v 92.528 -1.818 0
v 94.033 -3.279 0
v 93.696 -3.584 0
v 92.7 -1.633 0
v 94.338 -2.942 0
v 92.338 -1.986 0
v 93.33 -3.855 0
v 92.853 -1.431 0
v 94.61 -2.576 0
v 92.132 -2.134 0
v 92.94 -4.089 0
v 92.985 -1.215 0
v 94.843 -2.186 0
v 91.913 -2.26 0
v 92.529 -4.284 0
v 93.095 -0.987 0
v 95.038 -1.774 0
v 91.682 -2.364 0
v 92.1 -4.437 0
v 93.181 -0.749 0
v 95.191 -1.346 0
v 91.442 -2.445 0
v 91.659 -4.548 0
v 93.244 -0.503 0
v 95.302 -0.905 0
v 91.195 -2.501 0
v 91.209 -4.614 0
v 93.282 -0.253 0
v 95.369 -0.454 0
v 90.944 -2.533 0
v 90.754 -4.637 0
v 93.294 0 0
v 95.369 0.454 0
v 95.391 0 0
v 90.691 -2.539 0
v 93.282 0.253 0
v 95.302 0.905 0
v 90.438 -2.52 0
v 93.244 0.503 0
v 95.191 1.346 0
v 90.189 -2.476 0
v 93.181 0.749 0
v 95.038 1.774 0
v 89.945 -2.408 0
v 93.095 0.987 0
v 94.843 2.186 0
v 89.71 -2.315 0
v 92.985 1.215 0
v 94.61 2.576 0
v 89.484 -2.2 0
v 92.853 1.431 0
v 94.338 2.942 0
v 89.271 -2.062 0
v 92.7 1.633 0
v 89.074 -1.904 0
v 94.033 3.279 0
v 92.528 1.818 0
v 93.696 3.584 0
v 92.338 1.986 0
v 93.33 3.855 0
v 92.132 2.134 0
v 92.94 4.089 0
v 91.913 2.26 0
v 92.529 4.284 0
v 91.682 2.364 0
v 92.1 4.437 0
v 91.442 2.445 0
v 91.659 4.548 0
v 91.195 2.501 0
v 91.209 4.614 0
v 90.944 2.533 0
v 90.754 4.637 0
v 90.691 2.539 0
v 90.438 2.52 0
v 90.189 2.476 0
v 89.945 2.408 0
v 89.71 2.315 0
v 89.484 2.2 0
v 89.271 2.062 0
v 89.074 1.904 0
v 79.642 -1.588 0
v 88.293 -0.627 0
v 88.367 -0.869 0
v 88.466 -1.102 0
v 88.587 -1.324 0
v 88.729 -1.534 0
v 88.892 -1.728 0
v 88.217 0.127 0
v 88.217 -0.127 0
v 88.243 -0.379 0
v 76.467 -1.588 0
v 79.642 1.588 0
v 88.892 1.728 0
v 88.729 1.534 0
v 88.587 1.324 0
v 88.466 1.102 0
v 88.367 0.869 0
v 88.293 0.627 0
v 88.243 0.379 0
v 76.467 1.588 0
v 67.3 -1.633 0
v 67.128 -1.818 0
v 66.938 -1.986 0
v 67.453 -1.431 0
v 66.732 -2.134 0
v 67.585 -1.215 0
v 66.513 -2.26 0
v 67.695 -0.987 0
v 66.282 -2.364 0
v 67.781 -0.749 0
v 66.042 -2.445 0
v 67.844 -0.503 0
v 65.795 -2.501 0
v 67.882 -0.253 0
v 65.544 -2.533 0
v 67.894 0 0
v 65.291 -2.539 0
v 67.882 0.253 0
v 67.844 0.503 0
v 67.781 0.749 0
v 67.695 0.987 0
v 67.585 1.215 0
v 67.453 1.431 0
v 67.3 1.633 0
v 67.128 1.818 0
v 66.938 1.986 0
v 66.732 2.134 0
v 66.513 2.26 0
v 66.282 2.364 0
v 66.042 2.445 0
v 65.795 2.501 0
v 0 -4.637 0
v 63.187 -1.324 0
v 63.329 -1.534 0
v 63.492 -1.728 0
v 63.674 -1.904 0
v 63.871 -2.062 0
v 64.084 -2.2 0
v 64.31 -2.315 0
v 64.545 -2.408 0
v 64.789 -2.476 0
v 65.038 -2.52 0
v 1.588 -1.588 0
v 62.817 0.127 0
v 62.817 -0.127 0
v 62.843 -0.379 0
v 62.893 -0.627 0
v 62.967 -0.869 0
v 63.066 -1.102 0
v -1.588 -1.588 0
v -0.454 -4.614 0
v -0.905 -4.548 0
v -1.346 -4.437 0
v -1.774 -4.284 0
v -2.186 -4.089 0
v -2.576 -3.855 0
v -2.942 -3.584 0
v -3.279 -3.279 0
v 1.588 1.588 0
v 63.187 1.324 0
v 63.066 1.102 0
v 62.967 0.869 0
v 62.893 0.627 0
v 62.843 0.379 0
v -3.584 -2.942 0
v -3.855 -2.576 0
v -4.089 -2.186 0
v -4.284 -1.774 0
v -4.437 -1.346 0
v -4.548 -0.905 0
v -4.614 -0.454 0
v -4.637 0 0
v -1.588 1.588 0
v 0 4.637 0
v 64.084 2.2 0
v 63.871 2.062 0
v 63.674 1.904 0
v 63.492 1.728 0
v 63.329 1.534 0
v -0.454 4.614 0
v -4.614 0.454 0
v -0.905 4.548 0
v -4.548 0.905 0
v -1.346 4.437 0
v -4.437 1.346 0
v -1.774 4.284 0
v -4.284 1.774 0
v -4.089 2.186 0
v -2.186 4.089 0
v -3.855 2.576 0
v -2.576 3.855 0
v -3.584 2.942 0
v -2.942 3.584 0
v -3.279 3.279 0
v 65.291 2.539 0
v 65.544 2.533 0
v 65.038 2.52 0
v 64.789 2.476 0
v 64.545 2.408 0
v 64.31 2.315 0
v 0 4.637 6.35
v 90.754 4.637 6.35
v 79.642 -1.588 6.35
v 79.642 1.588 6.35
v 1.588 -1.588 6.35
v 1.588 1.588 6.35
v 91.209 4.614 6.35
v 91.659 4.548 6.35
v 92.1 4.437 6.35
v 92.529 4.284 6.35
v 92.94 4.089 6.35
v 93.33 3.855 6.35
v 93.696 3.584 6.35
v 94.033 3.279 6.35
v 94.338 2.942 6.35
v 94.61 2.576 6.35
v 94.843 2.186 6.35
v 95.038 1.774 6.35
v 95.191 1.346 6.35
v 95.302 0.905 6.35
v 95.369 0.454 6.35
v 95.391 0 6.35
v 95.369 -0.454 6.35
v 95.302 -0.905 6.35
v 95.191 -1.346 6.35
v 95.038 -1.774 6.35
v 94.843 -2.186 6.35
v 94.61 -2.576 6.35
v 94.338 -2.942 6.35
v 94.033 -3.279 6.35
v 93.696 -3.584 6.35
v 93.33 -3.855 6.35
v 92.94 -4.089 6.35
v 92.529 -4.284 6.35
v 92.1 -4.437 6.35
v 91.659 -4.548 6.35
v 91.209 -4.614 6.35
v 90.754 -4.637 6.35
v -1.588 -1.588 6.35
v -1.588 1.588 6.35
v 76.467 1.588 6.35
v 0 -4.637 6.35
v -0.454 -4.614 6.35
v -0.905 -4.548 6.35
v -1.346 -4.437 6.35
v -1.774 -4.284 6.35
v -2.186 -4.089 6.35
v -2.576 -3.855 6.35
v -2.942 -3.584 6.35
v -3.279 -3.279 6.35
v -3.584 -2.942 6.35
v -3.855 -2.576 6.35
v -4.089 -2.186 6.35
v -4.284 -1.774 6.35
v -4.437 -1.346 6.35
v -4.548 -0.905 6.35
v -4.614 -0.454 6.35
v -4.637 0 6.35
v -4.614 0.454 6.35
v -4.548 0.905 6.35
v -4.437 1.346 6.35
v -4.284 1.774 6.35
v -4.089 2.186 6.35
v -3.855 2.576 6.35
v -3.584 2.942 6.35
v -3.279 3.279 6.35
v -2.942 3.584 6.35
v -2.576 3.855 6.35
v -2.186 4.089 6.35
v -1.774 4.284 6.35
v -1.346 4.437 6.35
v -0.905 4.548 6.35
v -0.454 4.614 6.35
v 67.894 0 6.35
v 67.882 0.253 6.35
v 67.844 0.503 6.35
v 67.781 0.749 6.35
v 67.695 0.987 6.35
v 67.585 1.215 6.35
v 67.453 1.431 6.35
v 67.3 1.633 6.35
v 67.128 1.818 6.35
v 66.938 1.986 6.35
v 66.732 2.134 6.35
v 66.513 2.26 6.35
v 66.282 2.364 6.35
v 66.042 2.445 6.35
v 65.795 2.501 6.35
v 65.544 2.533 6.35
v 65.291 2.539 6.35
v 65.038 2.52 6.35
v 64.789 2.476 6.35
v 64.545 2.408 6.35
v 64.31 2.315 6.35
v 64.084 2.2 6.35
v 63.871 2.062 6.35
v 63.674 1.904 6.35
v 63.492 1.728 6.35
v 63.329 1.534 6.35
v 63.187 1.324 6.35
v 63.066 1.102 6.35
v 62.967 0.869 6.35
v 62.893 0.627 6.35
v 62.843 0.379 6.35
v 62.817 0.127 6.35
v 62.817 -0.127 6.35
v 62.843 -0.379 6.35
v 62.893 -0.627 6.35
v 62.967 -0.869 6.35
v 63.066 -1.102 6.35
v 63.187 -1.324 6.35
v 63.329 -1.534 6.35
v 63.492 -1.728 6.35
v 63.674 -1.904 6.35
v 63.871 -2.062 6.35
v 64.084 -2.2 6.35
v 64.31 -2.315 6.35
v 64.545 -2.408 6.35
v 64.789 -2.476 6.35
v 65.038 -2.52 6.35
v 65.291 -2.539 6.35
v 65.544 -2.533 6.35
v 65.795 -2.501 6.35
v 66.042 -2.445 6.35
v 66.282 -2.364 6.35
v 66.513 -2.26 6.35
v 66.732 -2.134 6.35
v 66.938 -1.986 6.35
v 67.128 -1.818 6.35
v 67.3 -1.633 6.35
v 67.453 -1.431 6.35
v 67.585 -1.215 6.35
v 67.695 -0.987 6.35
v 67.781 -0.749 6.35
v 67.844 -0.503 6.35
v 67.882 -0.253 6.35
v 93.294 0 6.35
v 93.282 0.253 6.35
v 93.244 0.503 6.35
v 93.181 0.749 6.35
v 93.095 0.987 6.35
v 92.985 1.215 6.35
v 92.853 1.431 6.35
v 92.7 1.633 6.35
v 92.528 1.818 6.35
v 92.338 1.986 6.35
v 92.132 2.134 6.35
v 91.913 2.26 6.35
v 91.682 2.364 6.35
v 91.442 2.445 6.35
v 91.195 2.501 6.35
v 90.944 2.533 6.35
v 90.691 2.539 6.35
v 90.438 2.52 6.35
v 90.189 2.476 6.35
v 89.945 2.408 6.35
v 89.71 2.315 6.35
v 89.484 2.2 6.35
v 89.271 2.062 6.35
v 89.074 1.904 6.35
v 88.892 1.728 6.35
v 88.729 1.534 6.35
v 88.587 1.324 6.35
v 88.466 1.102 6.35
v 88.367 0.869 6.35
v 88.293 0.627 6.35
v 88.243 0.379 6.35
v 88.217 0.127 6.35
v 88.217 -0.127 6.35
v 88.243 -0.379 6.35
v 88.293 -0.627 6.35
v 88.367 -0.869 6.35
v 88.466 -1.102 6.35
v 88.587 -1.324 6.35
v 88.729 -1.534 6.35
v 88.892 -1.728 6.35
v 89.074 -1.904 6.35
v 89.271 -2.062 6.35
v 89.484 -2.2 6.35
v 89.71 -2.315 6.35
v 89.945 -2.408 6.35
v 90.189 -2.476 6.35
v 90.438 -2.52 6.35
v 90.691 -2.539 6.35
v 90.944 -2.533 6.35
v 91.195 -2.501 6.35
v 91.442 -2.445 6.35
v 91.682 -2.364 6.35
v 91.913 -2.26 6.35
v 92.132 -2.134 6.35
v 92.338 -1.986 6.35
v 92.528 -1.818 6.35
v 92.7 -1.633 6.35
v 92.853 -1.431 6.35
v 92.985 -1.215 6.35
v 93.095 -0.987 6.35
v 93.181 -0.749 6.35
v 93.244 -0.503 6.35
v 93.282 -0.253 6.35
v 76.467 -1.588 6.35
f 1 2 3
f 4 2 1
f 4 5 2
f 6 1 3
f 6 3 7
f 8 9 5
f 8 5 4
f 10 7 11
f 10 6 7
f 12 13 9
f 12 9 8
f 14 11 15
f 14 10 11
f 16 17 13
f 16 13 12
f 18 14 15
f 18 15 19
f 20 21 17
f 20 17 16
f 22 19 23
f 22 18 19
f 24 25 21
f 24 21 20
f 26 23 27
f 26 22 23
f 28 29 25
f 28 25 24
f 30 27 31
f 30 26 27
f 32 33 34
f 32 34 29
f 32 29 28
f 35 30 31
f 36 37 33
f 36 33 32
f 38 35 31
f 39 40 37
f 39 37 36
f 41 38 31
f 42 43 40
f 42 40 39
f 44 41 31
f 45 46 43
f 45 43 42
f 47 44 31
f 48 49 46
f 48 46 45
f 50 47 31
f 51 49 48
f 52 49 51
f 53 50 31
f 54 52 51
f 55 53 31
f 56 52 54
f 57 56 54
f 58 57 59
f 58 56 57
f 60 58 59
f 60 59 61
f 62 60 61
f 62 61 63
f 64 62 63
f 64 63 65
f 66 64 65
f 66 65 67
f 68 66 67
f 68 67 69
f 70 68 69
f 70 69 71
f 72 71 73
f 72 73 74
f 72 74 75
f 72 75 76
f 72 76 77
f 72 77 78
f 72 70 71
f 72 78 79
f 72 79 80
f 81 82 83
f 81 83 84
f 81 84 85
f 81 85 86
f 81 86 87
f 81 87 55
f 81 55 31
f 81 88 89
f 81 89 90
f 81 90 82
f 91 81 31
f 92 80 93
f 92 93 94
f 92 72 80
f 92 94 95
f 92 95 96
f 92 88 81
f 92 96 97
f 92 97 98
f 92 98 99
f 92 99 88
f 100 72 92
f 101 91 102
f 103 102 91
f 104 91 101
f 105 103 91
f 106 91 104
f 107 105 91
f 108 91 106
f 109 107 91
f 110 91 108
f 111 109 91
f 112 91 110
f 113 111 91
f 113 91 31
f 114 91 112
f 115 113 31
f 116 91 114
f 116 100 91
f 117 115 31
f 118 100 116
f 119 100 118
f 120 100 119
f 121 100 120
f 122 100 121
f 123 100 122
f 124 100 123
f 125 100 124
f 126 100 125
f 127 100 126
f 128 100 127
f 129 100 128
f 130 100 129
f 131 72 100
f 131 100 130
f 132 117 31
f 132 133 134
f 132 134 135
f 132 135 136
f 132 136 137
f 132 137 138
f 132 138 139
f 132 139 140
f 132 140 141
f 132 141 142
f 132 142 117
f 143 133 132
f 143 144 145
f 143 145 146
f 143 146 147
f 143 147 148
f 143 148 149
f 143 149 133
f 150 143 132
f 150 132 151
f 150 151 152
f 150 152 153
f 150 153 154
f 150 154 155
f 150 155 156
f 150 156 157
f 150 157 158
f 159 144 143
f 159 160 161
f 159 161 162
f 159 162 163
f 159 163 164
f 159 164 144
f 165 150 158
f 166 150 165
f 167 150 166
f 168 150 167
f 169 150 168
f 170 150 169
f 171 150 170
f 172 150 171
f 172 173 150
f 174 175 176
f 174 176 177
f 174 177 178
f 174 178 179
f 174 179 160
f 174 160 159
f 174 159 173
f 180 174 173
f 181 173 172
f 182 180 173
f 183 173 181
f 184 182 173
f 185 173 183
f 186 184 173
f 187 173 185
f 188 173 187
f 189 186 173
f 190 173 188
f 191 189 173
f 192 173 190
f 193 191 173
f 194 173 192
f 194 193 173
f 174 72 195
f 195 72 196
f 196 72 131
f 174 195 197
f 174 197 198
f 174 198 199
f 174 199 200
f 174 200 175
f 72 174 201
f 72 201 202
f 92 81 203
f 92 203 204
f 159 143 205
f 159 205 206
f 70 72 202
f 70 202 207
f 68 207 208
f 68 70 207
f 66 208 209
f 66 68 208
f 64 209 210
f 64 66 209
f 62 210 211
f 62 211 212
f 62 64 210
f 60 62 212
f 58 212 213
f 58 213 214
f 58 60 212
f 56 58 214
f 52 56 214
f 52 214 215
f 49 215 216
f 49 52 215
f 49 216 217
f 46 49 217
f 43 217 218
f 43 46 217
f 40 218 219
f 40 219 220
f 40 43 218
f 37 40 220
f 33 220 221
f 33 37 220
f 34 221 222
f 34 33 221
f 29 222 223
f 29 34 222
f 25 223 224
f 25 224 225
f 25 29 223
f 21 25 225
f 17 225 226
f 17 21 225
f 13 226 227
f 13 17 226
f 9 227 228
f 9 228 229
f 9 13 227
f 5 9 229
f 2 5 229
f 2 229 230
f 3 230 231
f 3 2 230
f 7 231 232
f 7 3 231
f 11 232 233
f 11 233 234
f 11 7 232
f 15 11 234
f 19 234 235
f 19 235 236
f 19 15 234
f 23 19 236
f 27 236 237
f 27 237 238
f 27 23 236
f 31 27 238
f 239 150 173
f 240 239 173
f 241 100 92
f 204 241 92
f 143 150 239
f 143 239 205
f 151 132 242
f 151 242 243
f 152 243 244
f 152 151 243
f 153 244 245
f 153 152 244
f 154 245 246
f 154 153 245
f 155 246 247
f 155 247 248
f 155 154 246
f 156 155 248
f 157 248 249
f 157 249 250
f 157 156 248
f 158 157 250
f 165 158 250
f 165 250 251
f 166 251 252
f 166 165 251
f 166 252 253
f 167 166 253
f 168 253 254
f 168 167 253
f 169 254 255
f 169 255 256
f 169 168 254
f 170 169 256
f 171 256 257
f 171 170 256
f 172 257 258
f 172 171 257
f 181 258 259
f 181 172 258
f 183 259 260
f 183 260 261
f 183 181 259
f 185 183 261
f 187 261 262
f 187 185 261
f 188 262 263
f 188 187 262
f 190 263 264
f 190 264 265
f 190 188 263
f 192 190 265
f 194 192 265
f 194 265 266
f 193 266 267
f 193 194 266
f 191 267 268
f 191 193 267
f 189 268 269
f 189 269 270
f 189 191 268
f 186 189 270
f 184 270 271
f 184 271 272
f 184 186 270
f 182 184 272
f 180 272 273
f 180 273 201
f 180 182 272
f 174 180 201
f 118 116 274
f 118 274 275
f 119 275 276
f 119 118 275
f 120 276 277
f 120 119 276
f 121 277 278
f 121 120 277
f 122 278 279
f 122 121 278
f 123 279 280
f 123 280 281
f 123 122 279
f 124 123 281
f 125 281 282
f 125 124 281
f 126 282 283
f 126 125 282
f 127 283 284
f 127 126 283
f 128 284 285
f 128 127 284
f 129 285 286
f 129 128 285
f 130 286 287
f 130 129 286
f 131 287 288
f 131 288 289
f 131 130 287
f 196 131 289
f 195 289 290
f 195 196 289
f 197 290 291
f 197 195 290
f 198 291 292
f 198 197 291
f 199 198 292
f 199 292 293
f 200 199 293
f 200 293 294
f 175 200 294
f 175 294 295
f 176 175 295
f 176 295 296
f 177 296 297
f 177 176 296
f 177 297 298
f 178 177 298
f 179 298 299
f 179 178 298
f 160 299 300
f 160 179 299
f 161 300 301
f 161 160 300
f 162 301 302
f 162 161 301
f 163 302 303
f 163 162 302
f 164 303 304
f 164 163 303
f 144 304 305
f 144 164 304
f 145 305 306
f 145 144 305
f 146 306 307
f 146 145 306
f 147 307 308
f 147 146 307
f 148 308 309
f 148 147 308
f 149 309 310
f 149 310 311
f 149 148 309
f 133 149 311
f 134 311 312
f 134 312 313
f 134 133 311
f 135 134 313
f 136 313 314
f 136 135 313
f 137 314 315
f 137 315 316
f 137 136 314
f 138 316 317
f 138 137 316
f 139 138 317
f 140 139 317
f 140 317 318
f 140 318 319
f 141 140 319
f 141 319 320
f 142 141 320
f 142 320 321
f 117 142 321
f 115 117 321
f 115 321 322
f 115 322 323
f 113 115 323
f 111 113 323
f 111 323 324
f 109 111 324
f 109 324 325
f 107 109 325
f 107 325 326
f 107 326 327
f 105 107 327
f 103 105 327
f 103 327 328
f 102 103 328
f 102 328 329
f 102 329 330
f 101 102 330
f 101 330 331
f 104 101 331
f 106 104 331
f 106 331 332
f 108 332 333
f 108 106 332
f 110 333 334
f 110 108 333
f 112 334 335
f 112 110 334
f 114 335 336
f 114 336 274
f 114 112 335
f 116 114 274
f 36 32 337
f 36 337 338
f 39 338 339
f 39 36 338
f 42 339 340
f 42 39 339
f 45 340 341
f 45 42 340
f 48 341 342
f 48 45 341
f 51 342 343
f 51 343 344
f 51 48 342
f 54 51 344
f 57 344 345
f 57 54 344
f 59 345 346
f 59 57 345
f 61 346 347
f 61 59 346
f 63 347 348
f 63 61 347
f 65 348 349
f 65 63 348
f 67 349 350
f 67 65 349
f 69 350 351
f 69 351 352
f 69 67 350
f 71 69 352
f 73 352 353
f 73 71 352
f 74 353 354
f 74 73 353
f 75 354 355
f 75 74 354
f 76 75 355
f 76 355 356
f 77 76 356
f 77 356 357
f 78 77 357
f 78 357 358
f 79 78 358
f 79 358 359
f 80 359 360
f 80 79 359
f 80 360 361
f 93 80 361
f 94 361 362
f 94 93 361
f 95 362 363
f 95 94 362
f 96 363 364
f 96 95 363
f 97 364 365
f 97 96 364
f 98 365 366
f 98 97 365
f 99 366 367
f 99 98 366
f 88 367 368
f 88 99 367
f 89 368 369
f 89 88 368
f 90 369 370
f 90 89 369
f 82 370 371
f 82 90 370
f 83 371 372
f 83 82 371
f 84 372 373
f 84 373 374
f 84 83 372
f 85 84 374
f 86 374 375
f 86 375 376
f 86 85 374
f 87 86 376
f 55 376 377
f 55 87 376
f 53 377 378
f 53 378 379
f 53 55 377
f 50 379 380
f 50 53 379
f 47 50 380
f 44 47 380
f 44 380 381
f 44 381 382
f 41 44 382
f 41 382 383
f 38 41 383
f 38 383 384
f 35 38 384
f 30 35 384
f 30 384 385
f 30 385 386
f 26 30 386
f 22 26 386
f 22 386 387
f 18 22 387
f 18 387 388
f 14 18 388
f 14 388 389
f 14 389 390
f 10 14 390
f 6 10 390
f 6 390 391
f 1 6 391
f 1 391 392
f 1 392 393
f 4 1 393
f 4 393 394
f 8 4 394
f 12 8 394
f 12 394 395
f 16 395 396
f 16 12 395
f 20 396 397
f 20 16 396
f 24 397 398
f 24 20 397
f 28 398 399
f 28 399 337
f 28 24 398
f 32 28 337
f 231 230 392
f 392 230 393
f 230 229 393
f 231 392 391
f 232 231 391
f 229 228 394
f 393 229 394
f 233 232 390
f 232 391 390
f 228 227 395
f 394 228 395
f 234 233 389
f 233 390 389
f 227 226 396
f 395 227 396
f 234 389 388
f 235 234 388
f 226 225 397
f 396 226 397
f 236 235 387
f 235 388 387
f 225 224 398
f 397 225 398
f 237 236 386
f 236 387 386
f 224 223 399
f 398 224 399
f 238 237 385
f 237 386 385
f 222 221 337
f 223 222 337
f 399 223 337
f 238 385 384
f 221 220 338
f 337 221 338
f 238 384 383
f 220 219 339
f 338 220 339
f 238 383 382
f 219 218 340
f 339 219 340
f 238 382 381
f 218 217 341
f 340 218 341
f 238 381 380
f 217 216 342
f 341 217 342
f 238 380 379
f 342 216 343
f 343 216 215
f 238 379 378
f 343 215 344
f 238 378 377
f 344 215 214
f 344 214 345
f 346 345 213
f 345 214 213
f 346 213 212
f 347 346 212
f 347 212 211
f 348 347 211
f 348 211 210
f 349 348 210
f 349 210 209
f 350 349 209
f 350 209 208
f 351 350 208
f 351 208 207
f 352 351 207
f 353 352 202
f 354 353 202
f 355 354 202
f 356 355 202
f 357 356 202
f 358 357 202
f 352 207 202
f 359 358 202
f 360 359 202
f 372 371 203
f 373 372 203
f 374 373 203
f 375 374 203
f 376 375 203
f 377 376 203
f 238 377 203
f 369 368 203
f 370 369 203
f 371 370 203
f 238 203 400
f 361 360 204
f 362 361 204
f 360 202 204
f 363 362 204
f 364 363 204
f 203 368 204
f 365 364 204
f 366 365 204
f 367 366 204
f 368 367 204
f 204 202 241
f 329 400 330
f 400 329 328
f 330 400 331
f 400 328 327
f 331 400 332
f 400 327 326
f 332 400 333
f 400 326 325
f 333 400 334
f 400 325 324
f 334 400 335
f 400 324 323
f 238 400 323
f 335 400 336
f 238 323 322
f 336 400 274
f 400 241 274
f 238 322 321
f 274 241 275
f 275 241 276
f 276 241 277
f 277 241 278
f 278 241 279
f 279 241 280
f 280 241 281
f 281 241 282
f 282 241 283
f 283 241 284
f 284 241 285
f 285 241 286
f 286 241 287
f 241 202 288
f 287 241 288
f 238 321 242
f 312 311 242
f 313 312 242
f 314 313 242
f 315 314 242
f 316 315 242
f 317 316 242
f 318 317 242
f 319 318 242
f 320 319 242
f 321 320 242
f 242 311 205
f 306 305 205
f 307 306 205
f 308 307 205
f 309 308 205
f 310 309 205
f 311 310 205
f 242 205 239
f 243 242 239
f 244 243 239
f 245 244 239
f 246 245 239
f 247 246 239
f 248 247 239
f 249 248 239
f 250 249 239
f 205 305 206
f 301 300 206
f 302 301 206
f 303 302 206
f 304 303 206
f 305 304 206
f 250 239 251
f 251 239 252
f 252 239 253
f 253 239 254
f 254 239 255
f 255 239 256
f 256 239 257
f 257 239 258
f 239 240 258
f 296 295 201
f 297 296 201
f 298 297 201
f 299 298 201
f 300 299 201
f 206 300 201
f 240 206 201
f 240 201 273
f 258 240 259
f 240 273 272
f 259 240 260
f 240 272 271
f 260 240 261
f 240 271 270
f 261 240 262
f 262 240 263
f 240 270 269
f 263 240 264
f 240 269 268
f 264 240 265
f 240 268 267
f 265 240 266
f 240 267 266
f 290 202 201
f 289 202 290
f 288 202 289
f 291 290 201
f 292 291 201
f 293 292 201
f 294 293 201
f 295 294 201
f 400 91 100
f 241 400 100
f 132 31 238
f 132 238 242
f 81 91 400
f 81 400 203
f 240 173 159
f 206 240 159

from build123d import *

# Parameters (mm, degrees)
SKETCH1_R           = 2.54
SKETCH1_W           = 3.175
SKETCH1_H           = 3.175
BOSS_EXTRUDE1_DEPTH = 6.35


with BuildPart() as part:
    # Sketch1 → Boss-Extrude1 (new body)
    with BuildSketch(Plane.XY):
        with BuildLine():
            Line((0, 4.636775303), (90.7542, 4.636775303))
            ThreePointArc((90.7542, 4.636775303), (95.390975303, 0), (90.7542, -4.636775303))
            Line((90.7542, -4.636775303), (0, -4.636775303))
            ThreePointArc((0, -4.636775303), (-4.636775303, 0), (0, 4.636775303))
        make_face()
        with Locations((90.7542, 0)):
            Circle(SKETCH1_R, mode=Mode.SUBTRACT)
        with Locations((65.3542, 0)):
            Circle(SKETCH1_R, mode=Mode.SUBTRACT)
        with Locations((78.0542, 0)):
            Rectangle(SKETCH1_W, SKETCH1_H, mode=Mode.SUBTRACT)
        Rectangle(SKETCH1_W, SKETCH1_H, mode=Mode.SUBTRACT)
    extrude(amount=BOSS_EXTRUDE1_DEPTH)


solid = part.part
